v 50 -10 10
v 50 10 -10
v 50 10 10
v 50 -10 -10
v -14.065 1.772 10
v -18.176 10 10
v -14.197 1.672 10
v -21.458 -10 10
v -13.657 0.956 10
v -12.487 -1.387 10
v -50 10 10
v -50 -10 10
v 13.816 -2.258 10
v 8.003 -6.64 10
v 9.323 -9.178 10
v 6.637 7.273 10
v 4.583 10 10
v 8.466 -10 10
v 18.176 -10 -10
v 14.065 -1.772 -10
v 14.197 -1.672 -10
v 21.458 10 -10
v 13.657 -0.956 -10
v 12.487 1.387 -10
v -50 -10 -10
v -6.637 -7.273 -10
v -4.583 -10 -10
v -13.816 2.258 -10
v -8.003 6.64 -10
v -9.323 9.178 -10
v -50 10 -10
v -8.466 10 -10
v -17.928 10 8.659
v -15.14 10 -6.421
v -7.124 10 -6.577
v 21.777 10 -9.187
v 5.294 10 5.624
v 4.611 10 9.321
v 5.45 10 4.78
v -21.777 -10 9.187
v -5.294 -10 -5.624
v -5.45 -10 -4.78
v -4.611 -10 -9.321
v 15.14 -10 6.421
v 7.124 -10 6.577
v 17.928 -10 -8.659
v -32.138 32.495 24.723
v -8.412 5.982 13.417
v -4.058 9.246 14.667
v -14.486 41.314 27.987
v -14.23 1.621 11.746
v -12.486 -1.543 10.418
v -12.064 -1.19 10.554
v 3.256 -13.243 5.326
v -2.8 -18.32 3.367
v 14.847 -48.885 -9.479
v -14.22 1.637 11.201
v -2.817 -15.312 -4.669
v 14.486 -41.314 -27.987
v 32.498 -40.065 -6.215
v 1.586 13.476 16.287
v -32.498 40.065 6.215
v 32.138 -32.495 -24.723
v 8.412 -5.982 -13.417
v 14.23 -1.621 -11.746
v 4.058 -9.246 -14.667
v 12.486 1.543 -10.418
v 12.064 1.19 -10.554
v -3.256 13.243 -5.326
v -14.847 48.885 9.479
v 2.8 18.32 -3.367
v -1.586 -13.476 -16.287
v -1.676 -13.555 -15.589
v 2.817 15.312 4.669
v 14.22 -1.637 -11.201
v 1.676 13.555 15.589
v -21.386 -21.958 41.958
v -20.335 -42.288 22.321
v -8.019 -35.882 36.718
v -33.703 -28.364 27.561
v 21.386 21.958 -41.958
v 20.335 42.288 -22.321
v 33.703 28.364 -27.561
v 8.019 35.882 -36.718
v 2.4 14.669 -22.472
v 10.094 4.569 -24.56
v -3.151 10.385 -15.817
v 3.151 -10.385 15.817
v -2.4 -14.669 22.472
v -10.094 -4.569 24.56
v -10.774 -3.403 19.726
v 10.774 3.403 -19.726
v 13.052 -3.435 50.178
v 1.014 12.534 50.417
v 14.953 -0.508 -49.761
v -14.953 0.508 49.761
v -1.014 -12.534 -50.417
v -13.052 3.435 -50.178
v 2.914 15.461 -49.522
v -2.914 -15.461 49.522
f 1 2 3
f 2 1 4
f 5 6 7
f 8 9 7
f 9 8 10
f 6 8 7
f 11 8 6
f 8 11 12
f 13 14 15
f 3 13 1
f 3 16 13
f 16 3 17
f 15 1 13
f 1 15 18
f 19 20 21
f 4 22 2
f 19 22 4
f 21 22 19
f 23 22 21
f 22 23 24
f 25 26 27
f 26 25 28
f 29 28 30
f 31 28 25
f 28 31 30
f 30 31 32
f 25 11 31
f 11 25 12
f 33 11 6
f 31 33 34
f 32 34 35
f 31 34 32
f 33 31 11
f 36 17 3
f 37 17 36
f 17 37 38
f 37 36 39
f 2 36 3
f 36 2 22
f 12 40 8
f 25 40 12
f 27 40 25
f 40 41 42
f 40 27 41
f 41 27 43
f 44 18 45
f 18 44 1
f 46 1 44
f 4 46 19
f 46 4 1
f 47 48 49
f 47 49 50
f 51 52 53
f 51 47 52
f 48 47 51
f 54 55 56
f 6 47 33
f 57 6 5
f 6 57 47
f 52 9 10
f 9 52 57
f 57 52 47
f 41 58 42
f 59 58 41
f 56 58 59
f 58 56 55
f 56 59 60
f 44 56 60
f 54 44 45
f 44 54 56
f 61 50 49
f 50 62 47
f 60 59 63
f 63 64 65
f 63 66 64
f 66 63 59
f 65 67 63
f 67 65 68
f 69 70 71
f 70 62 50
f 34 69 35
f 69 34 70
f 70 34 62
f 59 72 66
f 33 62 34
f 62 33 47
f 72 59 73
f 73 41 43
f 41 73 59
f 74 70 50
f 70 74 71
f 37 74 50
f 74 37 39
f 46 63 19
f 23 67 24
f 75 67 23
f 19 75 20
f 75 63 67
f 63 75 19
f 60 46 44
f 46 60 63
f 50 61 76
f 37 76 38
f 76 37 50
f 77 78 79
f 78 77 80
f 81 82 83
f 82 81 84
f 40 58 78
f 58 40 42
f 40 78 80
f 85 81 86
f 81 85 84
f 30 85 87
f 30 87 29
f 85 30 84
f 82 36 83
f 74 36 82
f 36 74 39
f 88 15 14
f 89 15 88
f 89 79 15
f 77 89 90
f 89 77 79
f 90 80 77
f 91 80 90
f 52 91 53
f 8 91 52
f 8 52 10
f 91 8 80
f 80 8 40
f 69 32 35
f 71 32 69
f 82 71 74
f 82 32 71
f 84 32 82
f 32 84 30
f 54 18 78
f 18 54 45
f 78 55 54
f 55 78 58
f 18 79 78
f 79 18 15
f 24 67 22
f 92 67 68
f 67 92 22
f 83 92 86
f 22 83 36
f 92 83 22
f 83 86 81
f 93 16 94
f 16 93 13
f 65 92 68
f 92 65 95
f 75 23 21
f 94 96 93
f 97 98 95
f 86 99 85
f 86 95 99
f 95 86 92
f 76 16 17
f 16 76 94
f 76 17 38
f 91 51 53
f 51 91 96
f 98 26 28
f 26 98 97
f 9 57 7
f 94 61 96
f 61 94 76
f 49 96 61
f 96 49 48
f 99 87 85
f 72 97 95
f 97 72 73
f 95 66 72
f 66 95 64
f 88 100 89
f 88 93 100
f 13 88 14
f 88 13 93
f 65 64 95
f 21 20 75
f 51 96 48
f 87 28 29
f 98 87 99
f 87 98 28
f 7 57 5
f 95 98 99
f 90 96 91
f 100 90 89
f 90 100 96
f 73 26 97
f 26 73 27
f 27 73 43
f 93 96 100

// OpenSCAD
intersection() for(i = [[0, 0, 0],
                      [10, 20, 300],
                      [200, 40, 57],
                      [20, 88, 57]])
  rotate(i) cube([100, 20, 20], center = true);
